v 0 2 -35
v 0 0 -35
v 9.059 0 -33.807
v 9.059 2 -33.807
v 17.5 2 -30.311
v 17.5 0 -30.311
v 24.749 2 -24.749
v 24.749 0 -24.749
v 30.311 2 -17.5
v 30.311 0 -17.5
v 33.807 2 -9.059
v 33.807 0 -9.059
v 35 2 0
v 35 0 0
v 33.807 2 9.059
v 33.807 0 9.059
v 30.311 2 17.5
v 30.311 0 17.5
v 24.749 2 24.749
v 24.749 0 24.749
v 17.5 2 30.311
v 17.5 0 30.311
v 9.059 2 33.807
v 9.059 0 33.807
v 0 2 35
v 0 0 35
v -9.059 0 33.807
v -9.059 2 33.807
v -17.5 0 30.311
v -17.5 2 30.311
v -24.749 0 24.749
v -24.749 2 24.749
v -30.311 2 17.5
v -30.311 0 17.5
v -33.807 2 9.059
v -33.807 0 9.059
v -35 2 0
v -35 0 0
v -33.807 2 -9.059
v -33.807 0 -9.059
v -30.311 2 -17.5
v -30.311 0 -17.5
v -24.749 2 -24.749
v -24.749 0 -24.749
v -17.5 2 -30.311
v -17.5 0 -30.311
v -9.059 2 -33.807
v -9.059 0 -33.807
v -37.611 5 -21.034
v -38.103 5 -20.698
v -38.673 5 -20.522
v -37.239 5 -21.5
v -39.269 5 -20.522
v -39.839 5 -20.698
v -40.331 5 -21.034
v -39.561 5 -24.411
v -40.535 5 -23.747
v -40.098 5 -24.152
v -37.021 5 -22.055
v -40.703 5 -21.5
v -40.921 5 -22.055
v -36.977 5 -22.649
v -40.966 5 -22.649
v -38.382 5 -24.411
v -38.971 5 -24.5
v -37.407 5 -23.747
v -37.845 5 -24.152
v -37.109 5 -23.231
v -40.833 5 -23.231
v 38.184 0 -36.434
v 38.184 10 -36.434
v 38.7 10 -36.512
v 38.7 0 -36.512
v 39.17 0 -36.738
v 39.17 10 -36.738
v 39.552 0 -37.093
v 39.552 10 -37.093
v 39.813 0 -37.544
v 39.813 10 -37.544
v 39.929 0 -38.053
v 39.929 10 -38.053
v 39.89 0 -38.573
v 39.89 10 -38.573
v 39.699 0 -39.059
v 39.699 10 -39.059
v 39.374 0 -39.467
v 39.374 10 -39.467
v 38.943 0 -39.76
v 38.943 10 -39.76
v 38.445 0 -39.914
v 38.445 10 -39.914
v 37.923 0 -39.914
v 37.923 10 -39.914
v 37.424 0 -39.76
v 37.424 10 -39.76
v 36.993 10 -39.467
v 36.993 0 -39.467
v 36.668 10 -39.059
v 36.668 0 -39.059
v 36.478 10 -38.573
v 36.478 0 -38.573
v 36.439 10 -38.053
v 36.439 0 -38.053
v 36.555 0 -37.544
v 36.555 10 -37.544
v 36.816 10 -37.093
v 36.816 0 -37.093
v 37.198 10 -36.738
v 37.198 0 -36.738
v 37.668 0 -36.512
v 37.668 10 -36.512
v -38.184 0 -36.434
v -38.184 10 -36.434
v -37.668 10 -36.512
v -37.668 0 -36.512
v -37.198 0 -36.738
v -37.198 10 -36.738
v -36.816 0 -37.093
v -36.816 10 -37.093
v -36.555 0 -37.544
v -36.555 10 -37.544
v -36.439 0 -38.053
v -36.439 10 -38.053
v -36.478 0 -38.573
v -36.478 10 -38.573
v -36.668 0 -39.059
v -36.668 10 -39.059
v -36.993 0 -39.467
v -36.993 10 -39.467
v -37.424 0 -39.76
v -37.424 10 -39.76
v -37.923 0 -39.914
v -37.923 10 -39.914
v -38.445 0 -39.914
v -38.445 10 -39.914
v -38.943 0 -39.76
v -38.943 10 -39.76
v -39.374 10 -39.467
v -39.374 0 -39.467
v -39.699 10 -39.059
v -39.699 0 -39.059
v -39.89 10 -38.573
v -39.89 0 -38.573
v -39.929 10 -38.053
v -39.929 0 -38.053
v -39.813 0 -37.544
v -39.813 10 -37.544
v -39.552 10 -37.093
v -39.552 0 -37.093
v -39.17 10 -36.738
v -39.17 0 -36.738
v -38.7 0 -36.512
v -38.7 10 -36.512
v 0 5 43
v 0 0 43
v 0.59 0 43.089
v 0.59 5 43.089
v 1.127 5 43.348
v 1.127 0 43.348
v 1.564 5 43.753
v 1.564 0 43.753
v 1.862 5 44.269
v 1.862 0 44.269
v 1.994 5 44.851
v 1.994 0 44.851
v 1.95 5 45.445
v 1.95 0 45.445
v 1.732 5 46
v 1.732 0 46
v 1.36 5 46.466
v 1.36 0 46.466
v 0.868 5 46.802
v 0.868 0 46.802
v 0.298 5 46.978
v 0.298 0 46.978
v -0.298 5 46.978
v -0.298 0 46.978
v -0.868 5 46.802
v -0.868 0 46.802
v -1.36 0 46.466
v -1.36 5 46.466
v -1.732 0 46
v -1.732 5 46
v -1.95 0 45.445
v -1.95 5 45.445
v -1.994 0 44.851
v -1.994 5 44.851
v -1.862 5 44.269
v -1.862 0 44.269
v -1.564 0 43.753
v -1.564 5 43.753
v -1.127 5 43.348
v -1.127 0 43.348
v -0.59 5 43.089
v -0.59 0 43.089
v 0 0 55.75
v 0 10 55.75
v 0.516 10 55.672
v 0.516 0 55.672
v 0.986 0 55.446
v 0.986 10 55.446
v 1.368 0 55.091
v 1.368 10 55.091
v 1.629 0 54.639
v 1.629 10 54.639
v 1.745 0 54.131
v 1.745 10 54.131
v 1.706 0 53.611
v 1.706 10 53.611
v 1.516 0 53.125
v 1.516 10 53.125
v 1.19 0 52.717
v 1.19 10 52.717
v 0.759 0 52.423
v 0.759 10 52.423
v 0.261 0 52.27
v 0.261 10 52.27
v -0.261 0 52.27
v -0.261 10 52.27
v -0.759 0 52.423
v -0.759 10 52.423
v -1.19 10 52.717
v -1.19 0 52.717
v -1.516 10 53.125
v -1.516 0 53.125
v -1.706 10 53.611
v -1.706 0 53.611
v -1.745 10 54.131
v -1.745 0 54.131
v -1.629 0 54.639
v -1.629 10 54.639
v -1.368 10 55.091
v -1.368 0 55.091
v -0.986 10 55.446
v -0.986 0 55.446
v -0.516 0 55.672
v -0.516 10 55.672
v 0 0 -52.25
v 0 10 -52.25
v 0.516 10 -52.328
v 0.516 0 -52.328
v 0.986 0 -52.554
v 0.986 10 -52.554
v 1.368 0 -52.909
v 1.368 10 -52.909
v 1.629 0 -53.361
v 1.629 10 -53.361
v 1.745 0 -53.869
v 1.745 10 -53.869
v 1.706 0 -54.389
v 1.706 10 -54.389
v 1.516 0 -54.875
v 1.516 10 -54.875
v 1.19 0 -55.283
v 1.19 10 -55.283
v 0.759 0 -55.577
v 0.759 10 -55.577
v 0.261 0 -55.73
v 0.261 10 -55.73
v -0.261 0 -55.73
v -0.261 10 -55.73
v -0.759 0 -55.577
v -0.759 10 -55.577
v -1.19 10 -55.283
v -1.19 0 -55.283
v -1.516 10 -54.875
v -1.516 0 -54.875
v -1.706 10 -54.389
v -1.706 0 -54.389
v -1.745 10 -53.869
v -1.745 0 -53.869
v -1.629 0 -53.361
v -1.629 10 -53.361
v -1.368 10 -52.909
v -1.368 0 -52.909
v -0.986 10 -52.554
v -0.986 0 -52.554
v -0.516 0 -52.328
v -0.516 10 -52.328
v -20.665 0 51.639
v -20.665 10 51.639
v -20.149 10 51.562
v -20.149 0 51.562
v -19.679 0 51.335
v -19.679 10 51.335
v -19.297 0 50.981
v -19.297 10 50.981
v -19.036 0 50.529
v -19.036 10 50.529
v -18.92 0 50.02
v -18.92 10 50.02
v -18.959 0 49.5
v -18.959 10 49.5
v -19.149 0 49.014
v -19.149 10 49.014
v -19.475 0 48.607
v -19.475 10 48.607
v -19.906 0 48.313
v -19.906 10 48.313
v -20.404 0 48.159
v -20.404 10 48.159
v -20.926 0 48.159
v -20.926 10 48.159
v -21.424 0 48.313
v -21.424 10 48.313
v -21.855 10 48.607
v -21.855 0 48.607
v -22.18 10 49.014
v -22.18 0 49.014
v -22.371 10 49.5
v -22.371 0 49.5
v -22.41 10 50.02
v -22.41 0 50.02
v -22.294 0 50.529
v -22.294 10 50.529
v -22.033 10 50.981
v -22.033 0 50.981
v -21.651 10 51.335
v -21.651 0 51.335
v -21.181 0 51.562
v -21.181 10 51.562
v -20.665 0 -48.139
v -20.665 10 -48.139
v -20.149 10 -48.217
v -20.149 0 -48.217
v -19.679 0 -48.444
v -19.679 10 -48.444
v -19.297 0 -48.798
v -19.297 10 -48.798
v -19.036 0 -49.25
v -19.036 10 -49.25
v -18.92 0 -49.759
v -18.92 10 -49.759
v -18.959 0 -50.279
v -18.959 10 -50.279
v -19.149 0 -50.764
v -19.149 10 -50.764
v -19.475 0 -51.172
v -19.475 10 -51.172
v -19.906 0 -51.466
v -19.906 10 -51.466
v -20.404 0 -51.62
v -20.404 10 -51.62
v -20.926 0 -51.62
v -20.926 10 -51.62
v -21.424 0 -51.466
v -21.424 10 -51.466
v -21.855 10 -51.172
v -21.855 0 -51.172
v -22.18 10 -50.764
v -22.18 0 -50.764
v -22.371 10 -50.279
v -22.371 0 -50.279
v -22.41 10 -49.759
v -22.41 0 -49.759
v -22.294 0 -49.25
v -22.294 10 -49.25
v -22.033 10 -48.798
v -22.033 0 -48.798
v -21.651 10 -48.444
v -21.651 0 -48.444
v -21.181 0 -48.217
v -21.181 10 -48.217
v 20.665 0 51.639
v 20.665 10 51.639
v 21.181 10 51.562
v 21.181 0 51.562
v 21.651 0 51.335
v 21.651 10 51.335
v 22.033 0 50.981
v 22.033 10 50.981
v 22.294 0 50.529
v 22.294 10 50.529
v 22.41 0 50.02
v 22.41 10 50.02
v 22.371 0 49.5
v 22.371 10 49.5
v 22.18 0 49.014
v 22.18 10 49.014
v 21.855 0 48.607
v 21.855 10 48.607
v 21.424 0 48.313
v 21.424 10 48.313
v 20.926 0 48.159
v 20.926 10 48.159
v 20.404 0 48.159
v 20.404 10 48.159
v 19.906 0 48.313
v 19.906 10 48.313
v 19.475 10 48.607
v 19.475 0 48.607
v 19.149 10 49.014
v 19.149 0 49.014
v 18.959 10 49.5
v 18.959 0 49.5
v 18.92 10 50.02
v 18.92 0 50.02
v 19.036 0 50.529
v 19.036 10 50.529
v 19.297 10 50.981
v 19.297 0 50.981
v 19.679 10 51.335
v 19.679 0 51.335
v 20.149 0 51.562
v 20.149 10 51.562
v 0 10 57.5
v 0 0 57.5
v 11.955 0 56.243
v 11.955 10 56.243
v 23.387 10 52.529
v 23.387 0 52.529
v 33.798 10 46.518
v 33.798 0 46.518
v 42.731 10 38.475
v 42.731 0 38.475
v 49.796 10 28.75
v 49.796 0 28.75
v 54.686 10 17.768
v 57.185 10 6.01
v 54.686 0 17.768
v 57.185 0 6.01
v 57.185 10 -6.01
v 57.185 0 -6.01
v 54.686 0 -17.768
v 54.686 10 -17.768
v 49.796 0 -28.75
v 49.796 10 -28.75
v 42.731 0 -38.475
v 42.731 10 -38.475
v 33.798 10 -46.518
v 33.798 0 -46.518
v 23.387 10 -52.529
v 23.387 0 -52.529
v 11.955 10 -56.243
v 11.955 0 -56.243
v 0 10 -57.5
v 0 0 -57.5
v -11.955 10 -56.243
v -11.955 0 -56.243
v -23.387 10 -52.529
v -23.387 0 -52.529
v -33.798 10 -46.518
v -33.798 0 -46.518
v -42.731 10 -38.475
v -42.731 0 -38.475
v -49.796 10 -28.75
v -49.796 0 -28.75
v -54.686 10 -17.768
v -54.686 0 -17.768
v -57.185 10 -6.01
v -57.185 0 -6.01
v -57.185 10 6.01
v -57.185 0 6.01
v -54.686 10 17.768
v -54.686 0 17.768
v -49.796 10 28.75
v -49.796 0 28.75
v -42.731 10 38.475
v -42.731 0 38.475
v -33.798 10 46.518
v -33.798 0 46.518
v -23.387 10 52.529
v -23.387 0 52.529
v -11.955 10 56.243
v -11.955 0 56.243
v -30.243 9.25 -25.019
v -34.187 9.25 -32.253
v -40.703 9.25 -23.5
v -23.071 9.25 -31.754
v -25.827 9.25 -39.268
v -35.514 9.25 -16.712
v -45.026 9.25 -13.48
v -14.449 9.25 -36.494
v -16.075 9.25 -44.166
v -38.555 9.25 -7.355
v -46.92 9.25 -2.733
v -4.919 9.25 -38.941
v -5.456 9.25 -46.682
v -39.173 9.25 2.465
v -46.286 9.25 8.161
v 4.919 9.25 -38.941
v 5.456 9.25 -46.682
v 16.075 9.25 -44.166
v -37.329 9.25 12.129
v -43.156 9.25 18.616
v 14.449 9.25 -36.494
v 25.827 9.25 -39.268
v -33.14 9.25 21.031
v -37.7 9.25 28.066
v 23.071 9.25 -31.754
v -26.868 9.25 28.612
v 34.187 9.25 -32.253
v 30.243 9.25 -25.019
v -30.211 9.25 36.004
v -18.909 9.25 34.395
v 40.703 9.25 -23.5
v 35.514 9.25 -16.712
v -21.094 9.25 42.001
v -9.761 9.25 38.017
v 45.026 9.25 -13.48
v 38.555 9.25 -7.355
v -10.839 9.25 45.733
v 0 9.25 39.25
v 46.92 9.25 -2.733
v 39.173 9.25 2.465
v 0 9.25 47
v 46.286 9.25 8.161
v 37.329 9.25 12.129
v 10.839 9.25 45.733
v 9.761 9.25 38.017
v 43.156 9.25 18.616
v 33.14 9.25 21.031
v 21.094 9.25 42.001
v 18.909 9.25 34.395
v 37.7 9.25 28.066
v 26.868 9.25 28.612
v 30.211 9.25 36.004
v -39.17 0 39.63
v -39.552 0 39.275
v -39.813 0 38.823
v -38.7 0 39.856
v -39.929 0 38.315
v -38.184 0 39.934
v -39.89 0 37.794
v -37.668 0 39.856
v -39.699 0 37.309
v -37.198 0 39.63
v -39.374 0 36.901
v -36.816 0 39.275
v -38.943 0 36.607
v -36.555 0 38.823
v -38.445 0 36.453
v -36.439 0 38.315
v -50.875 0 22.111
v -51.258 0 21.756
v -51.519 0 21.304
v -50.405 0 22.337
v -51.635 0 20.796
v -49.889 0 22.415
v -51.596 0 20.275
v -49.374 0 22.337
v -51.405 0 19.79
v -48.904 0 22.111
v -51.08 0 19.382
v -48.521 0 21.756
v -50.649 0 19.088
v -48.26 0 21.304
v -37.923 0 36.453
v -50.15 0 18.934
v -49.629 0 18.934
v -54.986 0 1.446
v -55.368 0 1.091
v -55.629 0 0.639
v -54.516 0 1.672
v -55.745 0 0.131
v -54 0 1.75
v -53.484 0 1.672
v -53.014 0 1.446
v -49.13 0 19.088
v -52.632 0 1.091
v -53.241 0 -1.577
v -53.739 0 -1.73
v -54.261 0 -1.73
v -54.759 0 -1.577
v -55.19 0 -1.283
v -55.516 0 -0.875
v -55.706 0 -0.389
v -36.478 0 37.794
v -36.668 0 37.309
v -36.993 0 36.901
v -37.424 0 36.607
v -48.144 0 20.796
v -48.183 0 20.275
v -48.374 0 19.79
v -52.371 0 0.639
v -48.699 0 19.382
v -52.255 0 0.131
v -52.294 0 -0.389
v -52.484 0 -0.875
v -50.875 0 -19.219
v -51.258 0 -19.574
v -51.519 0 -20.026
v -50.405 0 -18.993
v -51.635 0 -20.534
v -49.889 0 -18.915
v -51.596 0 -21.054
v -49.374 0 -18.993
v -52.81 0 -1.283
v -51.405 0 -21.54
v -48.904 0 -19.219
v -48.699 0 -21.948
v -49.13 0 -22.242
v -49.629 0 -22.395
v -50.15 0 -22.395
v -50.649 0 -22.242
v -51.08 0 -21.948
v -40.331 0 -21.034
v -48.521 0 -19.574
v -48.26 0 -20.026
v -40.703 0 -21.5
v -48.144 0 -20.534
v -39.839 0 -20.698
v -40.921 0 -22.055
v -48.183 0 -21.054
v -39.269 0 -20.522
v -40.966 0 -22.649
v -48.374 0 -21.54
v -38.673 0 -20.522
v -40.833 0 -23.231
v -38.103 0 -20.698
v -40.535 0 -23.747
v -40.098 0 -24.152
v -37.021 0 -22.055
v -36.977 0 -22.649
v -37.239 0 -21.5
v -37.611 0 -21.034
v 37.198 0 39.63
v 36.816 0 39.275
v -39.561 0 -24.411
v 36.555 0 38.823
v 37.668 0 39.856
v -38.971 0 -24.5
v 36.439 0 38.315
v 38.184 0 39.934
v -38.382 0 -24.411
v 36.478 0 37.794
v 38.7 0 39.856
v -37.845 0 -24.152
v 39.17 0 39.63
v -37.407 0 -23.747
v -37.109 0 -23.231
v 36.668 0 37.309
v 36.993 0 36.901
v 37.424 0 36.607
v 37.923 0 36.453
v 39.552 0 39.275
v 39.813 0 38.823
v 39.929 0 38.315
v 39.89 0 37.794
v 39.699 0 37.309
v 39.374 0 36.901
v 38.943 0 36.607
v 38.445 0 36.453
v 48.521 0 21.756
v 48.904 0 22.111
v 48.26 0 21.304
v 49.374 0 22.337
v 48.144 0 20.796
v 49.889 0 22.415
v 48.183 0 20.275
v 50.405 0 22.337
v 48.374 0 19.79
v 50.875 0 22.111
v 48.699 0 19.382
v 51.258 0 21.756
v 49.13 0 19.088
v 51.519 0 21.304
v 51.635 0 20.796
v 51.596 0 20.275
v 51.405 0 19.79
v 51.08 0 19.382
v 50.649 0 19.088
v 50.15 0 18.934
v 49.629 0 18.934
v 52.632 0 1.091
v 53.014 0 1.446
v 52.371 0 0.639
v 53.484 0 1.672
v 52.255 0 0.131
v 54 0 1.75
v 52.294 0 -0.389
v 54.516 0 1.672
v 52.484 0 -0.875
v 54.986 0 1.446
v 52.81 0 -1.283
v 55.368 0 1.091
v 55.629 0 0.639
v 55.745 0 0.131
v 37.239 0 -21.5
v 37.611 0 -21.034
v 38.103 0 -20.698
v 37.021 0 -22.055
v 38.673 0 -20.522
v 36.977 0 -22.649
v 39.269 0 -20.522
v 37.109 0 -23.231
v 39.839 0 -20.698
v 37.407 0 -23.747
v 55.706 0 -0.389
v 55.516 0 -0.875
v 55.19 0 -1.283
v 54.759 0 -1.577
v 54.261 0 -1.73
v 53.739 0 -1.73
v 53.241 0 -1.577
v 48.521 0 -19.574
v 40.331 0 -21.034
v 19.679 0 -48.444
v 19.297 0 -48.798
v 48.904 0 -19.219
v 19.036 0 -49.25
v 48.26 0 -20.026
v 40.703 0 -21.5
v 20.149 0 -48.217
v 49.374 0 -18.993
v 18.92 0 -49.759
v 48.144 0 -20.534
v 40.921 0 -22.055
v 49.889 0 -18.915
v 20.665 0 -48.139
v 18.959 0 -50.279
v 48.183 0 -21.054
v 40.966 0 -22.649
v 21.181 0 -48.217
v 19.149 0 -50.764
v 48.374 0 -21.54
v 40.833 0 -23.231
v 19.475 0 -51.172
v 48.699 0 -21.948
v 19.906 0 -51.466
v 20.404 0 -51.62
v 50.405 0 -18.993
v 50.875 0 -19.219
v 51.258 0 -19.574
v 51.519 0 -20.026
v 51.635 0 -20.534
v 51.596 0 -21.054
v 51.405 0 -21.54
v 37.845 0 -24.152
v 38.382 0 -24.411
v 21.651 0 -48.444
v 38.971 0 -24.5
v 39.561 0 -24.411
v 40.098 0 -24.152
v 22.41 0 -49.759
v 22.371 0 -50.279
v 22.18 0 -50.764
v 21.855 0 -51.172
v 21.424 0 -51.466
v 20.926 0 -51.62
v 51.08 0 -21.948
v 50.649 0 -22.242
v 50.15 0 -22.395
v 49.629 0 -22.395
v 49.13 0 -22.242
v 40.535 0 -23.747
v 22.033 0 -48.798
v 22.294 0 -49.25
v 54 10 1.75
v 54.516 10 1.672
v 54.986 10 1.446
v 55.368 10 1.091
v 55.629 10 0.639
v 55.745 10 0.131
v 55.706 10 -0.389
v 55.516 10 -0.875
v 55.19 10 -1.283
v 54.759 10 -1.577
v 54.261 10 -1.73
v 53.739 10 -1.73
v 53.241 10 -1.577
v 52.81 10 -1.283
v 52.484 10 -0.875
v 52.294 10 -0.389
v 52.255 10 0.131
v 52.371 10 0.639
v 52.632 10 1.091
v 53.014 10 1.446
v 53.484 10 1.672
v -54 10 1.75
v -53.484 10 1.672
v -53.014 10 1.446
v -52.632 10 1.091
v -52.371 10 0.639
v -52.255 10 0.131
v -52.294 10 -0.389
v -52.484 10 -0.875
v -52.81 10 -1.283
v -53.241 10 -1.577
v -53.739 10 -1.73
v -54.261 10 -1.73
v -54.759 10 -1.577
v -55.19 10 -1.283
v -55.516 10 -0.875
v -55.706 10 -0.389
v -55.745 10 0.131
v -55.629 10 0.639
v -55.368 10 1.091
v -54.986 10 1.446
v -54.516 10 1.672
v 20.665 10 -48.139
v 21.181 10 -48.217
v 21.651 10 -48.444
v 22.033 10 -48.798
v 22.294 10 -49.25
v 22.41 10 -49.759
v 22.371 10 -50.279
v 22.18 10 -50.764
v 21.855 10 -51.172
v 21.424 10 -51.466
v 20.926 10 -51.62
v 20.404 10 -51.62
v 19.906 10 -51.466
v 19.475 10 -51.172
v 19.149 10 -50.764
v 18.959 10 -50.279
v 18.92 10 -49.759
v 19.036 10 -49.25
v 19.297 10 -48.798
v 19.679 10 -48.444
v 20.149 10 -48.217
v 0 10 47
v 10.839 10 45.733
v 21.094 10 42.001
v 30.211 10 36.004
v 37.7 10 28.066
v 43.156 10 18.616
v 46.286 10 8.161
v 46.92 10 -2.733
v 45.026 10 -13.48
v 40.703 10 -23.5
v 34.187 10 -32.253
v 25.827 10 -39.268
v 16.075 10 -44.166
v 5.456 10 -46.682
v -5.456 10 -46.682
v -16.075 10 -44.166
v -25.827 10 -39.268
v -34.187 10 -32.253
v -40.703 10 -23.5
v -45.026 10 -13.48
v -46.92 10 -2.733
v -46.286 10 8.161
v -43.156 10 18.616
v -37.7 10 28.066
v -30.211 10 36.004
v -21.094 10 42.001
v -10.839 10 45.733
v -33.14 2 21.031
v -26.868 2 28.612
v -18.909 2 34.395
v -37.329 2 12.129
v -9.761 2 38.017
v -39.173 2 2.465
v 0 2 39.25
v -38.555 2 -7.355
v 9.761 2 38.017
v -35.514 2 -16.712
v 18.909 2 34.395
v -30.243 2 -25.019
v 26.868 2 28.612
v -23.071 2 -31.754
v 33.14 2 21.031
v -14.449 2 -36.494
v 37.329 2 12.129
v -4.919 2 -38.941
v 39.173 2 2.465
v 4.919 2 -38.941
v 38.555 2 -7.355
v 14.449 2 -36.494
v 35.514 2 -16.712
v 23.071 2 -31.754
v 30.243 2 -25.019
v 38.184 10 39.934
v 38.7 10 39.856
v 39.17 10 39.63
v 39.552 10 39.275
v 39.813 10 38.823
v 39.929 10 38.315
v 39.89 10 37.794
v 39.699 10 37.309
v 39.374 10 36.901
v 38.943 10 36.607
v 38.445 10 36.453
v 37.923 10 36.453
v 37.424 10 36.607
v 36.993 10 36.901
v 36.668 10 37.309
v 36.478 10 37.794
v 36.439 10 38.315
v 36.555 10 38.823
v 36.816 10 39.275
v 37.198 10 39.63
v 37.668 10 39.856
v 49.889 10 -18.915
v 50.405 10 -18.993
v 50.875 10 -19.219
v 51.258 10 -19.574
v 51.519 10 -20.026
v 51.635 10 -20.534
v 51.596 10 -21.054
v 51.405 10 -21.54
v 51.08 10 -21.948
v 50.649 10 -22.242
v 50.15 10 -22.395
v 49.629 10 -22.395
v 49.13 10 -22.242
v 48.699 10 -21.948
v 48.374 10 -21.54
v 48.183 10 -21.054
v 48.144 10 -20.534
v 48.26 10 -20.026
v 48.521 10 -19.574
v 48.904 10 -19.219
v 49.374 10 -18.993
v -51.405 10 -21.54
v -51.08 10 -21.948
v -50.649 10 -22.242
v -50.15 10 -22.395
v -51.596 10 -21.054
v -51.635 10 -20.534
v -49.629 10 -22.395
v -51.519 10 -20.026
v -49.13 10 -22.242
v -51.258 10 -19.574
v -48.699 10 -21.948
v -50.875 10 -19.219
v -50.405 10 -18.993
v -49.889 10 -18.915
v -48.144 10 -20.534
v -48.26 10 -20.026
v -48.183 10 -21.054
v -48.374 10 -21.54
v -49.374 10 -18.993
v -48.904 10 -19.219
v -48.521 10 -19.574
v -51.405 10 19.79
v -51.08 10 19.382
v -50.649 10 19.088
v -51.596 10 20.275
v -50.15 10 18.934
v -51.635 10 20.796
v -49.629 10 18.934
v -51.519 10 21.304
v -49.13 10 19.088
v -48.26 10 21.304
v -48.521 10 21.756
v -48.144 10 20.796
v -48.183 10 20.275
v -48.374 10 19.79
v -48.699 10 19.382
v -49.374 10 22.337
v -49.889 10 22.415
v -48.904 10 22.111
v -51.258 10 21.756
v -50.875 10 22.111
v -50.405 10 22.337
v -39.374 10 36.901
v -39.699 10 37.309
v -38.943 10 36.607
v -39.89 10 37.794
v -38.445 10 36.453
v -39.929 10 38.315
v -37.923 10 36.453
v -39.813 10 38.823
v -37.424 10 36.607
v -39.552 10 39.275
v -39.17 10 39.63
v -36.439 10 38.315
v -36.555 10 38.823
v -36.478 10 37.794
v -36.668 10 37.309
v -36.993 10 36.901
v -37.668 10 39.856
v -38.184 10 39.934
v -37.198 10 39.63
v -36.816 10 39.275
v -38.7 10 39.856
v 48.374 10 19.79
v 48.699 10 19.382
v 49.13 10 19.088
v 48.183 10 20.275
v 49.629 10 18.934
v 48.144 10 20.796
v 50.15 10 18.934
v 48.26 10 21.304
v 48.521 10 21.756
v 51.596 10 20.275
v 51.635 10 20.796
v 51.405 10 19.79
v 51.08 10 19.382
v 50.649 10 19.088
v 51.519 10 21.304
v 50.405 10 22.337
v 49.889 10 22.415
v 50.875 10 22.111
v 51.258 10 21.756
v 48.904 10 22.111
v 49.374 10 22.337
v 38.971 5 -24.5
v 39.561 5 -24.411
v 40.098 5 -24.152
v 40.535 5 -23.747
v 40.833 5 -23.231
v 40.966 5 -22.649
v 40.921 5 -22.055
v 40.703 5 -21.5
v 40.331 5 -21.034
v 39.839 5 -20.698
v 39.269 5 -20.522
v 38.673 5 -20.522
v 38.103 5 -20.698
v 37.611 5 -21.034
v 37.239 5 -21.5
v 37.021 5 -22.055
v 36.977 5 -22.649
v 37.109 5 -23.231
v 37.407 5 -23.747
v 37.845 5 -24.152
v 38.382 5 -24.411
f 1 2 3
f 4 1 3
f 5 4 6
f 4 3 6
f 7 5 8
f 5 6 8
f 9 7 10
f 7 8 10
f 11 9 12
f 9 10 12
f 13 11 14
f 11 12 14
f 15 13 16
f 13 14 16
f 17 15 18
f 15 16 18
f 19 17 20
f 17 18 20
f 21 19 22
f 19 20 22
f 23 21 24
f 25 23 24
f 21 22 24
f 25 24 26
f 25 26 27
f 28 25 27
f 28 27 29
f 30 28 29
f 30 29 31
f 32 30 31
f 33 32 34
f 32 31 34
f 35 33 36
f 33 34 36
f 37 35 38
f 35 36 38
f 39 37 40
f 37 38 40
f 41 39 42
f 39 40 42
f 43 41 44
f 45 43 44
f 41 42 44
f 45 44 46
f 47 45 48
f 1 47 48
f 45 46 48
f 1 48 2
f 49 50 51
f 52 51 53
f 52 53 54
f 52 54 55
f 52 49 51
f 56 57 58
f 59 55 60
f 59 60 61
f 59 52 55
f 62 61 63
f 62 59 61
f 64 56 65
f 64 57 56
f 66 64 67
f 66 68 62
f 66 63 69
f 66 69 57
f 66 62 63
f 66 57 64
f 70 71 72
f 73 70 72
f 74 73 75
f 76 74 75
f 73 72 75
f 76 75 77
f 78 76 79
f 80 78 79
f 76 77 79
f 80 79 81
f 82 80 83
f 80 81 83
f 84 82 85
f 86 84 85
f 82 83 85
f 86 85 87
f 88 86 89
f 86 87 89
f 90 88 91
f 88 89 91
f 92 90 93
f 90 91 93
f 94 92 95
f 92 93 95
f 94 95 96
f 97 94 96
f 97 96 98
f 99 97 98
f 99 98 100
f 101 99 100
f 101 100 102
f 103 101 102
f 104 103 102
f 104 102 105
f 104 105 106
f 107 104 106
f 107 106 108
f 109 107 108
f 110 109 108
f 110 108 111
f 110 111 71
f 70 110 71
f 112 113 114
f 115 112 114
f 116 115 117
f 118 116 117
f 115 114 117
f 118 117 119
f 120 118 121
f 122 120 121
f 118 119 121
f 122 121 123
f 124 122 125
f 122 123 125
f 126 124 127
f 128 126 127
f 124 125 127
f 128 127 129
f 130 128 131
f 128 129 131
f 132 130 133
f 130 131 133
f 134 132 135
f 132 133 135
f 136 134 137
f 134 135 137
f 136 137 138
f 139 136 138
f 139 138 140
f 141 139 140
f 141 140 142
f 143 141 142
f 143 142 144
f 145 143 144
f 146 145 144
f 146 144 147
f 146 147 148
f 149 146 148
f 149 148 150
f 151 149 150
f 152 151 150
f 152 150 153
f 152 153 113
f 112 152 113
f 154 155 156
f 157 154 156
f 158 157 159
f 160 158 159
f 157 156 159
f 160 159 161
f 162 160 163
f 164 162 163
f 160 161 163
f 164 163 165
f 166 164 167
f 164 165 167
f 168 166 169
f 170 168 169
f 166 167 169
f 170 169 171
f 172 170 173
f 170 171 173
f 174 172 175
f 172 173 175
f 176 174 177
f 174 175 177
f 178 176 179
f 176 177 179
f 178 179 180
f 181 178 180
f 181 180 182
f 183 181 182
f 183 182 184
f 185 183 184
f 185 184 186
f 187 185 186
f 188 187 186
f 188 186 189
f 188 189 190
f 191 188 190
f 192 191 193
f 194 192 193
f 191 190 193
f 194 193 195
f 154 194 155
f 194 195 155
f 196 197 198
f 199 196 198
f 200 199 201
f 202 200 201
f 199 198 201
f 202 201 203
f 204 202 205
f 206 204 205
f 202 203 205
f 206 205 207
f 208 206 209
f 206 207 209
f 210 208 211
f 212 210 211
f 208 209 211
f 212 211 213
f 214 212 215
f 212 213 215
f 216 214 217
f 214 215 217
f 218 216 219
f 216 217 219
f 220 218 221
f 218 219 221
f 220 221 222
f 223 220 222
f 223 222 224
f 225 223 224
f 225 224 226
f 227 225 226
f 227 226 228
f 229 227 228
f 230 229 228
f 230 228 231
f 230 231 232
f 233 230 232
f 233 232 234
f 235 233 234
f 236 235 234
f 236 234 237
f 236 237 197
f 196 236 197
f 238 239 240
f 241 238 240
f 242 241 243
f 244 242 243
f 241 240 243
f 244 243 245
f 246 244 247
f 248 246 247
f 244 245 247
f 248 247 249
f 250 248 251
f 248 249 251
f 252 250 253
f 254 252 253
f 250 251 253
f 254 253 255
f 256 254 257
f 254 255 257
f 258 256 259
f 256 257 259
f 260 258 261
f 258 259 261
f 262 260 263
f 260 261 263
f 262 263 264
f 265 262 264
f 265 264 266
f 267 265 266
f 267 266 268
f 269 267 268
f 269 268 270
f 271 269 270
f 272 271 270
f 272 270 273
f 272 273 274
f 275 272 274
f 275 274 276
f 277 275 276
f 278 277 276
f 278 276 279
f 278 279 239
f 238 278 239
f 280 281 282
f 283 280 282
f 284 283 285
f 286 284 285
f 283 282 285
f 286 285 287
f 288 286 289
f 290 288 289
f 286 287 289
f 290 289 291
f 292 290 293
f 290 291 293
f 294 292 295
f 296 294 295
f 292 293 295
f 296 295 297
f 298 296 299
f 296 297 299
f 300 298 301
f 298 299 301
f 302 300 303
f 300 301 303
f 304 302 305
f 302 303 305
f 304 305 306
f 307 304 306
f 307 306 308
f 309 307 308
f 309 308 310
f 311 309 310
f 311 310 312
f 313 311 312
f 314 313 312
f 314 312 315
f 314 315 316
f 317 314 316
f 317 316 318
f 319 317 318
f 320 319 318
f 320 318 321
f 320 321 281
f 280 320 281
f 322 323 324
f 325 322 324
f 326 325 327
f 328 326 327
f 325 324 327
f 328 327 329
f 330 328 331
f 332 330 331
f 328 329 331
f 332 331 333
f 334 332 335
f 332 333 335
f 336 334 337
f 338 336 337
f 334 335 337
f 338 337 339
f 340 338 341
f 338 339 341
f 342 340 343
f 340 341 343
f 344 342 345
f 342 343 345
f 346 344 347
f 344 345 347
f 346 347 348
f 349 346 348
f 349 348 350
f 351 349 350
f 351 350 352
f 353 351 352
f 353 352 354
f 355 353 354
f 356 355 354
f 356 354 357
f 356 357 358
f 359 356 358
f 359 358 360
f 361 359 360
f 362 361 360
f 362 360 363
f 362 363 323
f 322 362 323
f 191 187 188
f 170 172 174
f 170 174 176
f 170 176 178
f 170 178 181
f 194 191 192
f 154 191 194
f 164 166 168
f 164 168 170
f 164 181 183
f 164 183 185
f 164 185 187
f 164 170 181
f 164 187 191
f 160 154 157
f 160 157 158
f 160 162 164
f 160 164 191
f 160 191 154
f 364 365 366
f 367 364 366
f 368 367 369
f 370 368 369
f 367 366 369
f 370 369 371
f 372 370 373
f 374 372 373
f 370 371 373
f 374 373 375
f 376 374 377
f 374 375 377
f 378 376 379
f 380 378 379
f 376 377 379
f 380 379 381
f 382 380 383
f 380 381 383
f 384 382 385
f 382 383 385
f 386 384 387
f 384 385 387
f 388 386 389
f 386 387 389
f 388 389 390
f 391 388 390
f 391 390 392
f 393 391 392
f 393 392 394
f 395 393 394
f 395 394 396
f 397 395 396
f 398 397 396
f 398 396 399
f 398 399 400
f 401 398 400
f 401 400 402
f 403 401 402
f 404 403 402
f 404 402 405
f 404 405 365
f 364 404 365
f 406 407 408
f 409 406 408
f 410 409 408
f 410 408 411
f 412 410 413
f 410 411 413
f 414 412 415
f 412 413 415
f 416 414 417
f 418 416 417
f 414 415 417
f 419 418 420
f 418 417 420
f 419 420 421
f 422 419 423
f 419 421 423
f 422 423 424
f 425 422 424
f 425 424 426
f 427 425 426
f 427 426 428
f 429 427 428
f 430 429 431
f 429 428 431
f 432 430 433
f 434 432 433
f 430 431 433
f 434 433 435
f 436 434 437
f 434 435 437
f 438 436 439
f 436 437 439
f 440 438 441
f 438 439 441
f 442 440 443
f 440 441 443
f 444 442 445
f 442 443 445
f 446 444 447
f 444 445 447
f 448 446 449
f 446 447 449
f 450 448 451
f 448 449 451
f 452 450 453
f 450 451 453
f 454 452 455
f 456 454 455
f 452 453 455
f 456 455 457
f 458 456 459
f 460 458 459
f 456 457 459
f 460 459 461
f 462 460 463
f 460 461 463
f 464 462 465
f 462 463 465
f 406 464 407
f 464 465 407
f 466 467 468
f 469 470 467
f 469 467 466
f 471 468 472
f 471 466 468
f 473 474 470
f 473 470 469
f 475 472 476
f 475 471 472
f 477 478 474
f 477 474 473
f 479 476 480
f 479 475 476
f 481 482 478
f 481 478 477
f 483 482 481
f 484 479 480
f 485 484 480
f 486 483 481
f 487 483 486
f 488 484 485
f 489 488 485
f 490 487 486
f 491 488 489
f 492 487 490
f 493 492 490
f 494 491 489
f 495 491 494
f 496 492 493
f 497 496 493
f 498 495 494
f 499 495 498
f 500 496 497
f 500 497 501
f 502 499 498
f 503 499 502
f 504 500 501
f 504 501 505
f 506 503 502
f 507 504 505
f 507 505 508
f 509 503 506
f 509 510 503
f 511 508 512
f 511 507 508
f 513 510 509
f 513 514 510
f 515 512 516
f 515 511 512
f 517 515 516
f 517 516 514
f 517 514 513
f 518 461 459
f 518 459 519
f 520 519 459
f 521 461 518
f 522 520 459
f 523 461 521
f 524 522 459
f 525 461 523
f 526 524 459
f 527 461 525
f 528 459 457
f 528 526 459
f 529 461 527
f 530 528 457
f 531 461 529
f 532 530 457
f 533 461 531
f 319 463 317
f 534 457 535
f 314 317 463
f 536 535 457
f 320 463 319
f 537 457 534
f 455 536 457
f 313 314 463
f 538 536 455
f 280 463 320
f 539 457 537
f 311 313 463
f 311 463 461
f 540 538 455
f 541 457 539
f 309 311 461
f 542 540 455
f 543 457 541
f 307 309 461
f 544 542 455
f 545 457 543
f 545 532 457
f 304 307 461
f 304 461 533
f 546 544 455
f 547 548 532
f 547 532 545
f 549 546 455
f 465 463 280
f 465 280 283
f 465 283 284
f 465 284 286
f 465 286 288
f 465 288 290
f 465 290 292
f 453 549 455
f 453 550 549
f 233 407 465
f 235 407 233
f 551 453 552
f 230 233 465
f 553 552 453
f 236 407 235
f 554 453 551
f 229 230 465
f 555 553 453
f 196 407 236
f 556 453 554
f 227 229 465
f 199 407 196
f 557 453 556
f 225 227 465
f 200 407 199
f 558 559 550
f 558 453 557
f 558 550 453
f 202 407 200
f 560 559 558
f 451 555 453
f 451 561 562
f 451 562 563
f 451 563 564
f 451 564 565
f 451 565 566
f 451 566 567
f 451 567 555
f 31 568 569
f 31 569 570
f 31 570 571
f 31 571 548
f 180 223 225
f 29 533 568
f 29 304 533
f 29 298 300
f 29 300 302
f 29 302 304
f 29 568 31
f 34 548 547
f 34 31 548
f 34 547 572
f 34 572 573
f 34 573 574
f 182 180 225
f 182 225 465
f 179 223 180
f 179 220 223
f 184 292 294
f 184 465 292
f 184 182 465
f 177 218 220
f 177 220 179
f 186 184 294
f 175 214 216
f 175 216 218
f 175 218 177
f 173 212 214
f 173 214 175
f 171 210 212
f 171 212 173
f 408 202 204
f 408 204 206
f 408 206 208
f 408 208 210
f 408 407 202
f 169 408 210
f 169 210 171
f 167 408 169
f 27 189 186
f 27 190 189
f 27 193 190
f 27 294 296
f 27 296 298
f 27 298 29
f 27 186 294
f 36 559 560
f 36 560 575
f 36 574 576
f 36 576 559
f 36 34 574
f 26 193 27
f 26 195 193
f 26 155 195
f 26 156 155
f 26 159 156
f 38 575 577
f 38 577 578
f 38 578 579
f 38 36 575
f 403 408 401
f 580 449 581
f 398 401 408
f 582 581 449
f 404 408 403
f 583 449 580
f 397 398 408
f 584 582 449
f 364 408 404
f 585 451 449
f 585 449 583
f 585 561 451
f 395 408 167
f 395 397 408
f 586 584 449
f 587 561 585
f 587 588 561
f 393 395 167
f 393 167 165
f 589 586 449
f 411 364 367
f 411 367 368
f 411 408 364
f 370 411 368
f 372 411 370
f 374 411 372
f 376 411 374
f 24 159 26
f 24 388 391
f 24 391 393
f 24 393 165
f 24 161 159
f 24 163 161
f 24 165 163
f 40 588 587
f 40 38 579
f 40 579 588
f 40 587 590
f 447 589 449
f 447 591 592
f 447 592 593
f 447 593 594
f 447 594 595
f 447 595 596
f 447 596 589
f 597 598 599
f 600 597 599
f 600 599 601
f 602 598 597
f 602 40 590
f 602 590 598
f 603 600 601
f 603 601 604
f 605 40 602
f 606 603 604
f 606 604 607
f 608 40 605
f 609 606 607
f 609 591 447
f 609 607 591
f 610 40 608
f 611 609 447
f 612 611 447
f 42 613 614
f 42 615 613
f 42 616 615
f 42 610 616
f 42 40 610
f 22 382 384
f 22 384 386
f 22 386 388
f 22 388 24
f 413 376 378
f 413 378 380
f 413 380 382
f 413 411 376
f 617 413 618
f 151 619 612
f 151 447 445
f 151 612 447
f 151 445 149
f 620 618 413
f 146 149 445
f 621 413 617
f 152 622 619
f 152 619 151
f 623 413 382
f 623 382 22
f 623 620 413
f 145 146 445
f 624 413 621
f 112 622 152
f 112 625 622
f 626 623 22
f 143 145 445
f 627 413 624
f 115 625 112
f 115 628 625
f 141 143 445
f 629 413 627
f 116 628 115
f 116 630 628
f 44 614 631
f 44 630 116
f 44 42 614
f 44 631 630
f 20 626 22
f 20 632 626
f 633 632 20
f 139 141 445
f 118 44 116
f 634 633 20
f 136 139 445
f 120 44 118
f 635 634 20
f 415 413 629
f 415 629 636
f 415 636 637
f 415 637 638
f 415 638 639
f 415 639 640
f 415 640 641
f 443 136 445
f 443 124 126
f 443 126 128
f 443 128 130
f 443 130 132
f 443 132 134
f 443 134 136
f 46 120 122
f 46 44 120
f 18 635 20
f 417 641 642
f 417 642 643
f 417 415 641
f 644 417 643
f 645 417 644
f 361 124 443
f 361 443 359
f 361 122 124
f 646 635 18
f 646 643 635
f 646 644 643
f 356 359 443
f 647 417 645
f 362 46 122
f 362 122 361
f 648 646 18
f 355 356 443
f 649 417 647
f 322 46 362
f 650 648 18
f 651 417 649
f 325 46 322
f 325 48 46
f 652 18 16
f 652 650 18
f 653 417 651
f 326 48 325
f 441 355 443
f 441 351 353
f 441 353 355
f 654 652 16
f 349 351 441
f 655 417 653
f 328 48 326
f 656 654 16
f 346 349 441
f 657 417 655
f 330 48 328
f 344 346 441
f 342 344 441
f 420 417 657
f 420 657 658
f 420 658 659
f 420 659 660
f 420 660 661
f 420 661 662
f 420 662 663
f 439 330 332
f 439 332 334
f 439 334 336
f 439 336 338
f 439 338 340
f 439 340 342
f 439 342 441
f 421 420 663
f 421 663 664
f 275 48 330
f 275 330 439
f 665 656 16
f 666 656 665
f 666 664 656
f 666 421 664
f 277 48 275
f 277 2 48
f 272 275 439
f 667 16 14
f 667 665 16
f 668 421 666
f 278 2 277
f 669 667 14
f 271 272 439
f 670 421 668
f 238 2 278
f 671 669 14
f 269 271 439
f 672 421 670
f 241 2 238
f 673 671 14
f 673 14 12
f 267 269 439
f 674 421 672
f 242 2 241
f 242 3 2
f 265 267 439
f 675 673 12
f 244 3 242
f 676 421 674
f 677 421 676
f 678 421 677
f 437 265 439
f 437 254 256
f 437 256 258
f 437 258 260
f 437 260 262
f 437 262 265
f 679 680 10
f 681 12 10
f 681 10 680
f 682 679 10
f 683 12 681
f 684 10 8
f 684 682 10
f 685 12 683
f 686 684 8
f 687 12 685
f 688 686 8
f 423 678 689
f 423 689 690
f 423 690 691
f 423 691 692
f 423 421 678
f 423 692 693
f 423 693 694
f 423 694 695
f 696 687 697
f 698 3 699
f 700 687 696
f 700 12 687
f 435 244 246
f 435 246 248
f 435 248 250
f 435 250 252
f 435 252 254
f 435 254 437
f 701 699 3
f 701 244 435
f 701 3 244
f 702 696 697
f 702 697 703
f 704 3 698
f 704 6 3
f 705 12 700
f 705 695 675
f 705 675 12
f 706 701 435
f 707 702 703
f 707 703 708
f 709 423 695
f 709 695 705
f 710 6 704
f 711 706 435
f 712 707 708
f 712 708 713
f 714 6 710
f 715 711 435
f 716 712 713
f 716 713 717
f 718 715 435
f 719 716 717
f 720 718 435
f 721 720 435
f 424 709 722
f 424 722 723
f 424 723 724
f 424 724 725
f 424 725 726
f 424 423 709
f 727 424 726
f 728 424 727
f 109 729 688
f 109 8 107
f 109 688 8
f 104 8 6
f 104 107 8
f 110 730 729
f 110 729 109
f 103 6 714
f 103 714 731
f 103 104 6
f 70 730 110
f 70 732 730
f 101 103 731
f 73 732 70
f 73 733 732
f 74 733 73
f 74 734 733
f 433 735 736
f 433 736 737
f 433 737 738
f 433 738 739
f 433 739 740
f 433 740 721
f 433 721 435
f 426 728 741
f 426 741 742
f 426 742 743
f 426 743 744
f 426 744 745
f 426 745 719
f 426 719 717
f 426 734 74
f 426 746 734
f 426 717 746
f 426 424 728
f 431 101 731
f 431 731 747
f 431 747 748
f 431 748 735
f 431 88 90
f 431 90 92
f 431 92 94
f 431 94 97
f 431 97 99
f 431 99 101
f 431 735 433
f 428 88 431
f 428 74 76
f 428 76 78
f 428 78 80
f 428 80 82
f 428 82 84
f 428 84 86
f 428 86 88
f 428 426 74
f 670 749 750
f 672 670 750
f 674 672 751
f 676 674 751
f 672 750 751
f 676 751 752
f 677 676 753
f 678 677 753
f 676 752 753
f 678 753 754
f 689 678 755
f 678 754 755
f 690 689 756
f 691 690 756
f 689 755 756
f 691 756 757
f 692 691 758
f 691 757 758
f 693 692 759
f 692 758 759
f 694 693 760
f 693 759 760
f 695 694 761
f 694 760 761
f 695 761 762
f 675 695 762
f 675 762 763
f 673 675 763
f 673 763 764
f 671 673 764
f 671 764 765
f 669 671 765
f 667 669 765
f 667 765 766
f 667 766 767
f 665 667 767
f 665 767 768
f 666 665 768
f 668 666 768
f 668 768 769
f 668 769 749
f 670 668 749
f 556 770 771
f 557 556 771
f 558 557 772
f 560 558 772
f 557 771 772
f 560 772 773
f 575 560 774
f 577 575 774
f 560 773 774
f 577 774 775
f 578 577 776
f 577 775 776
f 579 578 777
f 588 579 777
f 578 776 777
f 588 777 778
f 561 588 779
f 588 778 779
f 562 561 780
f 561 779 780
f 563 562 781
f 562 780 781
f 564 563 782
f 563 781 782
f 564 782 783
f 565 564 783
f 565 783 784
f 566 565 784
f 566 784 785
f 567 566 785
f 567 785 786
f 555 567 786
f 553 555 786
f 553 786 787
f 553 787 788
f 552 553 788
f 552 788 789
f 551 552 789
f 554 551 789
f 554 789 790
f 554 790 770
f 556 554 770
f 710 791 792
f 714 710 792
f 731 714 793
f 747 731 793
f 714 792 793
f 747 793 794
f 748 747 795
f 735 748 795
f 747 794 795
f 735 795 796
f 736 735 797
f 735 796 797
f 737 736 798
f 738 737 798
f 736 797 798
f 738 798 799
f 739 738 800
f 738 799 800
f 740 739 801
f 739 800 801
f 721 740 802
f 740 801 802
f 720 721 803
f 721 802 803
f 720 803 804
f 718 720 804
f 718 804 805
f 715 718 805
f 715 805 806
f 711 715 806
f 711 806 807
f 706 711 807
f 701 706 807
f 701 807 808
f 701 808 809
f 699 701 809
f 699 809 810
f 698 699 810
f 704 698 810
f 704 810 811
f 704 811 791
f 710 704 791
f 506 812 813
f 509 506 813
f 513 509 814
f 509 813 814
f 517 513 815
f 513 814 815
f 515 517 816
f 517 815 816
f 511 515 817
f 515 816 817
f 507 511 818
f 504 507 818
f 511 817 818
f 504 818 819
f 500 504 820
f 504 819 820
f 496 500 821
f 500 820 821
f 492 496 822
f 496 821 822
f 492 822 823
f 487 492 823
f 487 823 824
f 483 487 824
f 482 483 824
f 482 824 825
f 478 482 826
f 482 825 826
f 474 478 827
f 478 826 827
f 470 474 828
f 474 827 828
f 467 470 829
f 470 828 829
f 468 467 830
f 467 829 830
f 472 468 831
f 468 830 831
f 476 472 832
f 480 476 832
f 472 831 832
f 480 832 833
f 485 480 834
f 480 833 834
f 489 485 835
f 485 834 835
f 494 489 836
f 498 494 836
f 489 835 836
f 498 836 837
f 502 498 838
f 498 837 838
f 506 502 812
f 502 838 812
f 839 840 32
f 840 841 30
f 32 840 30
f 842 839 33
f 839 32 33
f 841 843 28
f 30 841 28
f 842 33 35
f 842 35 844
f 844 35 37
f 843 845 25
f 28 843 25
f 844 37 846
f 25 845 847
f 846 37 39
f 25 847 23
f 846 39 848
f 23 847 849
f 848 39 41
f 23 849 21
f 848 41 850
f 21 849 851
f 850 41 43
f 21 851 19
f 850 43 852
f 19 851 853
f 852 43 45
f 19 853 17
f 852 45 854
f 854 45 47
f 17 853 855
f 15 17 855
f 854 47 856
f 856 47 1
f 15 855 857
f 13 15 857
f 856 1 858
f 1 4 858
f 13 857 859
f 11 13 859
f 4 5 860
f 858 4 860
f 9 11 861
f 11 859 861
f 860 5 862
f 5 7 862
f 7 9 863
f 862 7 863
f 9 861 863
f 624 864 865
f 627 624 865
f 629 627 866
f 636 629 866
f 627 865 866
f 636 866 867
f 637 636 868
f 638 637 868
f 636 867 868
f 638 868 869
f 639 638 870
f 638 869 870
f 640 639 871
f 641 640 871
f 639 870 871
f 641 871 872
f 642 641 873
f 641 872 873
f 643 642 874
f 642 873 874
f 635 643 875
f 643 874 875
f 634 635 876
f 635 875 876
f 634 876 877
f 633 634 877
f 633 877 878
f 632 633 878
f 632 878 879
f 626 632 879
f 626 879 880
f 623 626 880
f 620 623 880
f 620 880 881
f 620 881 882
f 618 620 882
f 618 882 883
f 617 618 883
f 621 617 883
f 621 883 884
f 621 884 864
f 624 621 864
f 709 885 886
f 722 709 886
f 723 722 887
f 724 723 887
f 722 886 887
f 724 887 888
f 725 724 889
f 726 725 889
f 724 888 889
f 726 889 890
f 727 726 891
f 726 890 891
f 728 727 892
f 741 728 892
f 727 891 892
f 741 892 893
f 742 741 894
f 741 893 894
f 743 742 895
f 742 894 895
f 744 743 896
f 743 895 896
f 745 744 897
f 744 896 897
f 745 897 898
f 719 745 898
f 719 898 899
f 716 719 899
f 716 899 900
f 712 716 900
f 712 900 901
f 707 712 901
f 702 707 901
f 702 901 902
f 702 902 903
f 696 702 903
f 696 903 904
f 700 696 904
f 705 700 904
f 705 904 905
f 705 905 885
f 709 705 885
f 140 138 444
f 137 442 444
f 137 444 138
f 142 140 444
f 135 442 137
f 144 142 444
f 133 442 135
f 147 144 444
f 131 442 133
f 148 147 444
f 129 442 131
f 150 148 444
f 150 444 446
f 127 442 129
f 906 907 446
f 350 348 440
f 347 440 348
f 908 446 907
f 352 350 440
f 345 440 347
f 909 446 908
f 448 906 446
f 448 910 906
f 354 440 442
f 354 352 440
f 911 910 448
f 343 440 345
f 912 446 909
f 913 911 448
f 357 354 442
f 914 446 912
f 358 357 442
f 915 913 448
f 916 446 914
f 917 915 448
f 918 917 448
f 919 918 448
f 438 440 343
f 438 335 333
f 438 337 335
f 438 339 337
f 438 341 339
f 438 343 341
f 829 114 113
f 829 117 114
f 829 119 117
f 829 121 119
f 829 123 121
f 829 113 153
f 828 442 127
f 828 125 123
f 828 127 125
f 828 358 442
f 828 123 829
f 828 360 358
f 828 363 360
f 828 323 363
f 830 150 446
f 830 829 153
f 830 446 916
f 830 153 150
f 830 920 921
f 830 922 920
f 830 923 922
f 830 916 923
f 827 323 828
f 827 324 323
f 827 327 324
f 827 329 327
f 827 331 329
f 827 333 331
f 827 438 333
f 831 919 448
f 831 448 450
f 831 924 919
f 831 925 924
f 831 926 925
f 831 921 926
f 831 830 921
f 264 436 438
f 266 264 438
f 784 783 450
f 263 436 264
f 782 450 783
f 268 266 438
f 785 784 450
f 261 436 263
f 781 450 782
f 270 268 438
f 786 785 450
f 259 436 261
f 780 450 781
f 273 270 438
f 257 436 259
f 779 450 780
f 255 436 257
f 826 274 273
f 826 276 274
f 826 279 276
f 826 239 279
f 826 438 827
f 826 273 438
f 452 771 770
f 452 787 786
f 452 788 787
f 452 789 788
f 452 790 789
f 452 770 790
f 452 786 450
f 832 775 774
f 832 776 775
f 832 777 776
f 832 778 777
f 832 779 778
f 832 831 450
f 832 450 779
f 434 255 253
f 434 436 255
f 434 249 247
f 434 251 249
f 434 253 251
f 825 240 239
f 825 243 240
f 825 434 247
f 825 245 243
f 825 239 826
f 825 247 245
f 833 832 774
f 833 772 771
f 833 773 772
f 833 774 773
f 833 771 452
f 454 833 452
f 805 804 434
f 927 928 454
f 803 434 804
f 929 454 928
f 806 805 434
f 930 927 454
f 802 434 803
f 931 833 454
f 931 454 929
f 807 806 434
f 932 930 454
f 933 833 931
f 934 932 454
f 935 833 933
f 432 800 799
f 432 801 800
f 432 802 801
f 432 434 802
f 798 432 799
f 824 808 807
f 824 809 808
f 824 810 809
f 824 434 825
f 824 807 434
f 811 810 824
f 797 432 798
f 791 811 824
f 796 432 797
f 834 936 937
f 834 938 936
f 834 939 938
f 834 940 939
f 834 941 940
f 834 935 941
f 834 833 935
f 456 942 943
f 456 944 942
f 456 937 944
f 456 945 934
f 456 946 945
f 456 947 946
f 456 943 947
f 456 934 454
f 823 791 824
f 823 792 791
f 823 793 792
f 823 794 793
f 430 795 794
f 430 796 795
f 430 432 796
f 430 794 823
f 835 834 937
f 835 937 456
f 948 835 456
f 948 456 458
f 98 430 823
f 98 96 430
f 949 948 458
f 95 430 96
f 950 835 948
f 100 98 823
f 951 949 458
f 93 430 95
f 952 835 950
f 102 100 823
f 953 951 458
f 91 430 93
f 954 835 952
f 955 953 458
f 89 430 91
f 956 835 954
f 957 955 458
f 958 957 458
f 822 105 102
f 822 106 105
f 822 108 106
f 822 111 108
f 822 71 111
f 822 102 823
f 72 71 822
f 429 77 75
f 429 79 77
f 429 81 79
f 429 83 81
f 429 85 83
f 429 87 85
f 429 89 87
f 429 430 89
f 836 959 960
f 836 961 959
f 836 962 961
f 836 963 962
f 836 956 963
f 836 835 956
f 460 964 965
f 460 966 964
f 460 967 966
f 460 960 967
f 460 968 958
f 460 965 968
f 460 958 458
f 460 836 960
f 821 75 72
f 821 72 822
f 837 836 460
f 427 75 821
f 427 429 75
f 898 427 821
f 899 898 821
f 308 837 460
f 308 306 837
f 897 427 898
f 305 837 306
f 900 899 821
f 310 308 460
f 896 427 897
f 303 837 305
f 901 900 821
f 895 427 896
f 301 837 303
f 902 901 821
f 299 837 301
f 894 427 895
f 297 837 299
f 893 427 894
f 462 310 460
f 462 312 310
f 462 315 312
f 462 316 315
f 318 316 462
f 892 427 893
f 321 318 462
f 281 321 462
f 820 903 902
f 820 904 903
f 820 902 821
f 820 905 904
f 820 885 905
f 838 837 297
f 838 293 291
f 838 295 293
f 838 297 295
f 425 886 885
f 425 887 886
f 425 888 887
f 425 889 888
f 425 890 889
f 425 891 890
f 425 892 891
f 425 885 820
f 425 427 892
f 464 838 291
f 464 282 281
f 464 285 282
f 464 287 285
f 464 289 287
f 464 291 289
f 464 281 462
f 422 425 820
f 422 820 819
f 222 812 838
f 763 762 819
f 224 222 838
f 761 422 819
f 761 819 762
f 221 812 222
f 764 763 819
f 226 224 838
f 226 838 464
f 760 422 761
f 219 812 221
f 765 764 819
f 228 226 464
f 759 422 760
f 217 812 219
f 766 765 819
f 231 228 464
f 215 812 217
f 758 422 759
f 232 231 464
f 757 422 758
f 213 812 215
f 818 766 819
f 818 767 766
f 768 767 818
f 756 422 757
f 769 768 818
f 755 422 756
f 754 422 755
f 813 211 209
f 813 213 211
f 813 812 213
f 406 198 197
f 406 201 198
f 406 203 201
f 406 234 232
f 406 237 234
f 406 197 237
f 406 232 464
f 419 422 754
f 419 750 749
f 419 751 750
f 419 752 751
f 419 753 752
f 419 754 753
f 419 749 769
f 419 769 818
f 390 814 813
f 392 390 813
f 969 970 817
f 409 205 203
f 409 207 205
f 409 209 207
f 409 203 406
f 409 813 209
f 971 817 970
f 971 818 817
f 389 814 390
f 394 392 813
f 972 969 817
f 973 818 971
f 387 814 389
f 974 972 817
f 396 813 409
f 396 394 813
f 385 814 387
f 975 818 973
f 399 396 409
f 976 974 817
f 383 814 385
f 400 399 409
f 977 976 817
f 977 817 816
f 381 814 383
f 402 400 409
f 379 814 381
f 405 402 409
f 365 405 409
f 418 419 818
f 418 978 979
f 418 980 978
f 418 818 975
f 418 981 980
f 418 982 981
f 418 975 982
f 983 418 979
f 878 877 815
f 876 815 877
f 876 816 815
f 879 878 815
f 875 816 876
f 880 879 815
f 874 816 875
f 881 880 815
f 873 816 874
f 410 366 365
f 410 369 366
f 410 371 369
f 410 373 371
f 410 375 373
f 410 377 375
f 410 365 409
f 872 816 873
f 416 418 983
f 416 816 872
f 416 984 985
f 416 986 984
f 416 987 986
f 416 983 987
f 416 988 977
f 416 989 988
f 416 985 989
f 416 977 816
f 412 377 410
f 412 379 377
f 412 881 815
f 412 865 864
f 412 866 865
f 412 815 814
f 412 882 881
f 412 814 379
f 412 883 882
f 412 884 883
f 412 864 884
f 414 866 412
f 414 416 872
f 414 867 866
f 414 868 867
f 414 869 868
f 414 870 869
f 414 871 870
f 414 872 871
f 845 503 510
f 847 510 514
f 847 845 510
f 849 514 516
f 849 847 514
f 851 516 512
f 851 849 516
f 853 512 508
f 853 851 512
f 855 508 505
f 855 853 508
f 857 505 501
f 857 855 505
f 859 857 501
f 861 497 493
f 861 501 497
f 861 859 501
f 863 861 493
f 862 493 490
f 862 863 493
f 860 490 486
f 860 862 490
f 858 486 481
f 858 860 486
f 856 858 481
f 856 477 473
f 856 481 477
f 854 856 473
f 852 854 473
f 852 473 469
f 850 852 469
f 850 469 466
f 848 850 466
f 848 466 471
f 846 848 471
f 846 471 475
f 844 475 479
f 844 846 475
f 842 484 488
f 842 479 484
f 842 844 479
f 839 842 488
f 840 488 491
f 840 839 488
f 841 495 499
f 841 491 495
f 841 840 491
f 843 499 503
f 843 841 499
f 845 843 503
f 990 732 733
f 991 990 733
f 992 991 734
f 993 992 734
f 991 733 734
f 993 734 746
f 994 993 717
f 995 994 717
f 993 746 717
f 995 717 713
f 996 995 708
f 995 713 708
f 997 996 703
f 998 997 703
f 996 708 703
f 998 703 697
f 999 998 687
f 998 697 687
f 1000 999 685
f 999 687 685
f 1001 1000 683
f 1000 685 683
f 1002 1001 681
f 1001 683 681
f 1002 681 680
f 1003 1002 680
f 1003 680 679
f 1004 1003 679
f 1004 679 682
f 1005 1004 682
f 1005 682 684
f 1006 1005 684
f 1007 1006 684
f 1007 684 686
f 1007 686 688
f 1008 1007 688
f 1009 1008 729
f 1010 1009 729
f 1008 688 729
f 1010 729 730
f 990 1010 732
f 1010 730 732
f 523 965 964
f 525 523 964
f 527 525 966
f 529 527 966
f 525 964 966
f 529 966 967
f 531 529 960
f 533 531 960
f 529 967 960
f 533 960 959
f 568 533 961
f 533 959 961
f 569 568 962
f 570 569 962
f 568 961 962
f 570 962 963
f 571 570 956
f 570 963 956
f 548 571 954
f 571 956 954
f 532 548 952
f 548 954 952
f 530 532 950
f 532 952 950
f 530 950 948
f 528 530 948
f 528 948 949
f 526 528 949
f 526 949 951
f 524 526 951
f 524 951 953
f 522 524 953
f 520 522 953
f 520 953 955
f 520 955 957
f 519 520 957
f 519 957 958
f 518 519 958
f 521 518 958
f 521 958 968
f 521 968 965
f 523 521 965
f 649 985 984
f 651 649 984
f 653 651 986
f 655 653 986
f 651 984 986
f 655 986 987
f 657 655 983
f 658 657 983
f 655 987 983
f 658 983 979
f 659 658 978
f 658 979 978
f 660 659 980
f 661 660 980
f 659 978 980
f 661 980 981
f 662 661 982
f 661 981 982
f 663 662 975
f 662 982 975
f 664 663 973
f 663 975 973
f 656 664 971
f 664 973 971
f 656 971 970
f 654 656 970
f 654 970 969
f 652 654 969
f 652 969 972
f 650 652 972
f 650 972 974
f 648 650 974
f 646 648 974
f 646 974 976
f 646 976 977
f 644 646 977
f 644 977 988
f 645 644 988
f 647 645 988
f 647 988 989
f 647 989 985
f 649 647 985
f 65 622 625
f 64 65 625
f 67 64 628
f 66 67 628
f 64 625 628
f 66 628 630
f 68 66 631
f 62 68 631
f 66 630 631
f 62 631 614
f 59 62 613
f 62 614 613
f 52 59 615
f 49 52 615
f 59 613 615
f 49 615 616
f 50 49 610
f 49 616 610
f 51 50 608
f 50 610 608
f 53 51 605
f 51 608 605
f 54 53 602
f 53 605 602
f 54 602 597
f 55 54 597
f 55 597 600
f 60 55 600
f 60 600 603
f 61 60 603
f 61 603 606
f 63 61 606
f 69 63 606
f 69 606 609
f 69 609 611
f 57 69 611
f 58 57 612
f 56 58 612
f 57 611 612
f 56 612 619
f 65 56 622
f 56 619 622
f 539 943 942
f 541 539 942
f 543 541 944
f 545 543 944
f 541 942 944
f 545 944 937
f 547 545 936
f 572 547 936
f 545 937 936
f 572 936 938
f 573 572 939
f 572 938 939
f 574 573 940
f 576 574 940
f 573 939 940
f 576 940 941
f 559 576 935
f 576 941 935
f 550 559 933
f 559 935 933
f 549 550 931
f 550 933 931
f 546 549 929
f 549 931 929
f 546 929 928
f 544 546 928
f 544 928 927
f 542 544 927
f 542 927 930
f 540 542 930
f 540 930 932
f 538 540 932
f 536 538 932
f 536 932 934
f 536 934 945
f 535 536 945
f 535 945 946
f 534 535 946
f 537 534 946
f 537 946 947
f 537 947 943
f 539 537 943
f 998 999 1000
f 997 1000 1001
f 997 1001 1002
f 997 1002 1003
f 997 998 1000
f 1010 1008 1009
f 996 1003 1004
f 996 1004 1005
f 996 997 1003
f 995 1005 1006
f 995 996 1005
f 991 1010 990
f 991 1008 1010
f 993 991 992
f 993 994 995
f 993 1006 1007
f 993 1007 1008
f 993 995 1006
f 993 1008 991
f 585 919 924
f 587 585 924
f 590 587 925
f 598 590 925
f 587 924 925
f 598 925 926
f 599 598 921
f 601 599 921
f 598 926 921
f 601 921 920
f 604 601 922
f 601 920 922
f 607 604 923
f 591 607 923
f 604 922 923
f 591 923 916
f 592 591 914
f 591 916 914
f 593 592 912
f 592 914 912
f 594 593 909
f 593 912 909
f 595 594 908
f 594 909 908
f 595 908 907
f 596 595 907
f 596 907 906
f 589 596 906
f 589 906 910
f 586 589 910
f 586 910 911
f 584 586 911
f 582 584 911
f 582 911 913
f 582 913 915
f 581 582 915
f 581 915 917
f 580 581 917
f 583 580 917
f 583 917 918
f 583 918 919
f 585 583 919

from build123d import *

# Parameters (mm, degrees)
SKETCH1_R           = 57.5
SKETCH1_R_2         = 39.25
BOSS_EXTRUDE1_DEPTH = 10
SKETCH2_R           = 1.75
CUT_EXTRUDE1_DEPTH  = 17
SKETCH3_R           = 47
CUT_EXTRUDE2_DEPTH  = 0.75
SKETCH5_R           = 2
CUT_EXTRUDE3_DEPTH  = 5
SKETCH6_R           = 39.25
SKETCH6_R_2         = 35
BOSS_EXTRUDE2_DEPTH = 2


with BuildPart() as part:
    # Sketch1 → Boss-Extrude1 (new body)
    with BuildSketch(Plane(origin=(0, 0, 0), x_dir=(1, 0, 0), z_dir=(0, 1, 0))):
        with Locations(Location((0, 0, 0), (0, 0, 270))):
            Circle(SKETCH1_R)
        with Locations(Location((0, 0, 0), (0, 0, 270))):
            Circle(SKETCH1_R_2, mode=Mode.SUBTRACT)
    extrude(amount=BOSS_EXTRUDE1_DEPTH)

    # Sketch2 → Cut-Extrude1 (cut)
    with BuildSketch(Plane(origin=(0, 10, 0), x_dir=(1, 0, 0), z_dir=(0, 1, 0))):
        with Locations(Location((0, 54, 0), (0, 0, 270))):
            Circle(SKETCH2_R)
        with Locations(Location((20.664905348, 49.889494756, 0), (0, 0, 270))):
            Circle(SKETCH2_R)
        with Locations(Location((38.183766184, 38.183766184, 0), (0, 0, 270))):
            Circle(SKETCH2_R)
        with Locations(Location((49.889494756, 20.664905348, 0), (0, 0, 270))):
            Circle(SKETCH2_R)
        with Locations(Location((54, 0, 0), (0, 0, 270))):
            Circle(SKETCH2_R)
        with Locations(Location((49.889494756, -20.664905348, 0), (0, 0, 270))):
            Circle(SKETCH2_R)
        with Locations(Location((38.183766184, -38.183766184, 0), (0, 0, 270))):
            Circle(SKETCH2_R)
        with Locations(Location((20.664905348, -49.889494756, 0), (0, 0, 270))):
            Circle(SKETCH2_R)
        with Locations(Location((0, -54, 0), (0, 0, 270))):
            Circle(SKETCH2_R)
        with Locations(Location((-20.664905348, -49.889494756, 0), (0, 0, 270))):
            Circle(SKETCH2_R)
        with Locations(Location((-38.183766184, -38.183766184, 0), (0, 0, 270))):
            Circle(SKETCH2_R)
        with Locations(Location((-49.889494756, -20.664905348, 0), (0, 0, 270))):
            Circle(SKETCH2_R)
        with Locations(Location((-54, 0, 0), (0, 0, 270))):
            Circle(SKETCH2_R)
        with Locations(Location((-49.889494756, 20.664905348, 0), (0, 0, 270))):
            Circle(SKETCH2_R)
        with Locations(Location((-38.183766184, 38.183766184, 0), (0, 0, 270))):
            Circle(SKETCH2_R)
        with Locations(Location((-20.664905348, 49.889494756, 0), (0, 0, 270))):
            Circle(SKETCH2_R)
    extrude(amount=-CUT_EXTRUDE1_DEPTH, mode=Mode.SUBTRACT)

    # Sketch3 → Cut-Extrude2 (cut)
    with BuildSketch(Plane(origin=(0, 10, 0), x_dir=(1, 0, 0), z_dir=(0, 1, 0))):
        with Locations(Location((0, 0, 0), (0, 0, 270))):
            Circle(SKETCH3_R)
    extrude(amount=-CUT_EXTRUDE2_DEPTH, mode=Mode.SUBTRACT)

    # Sketch5 → Cut-Extrude3 (cut)
    with BuildSketch(Plane.XZ):
        with Locations(Location((0, 45, 0), (0, 0, 270))):
            Circle(SKETCH5_R)
        with Locations(Location((38.97114317, -22.5, 0), (0, 0, 270))):
            Circle(SKETCH5_R)
        with Locations(Location((-38.97114317, -22.5, 0), (0, 0, 270))):
            Circle(SKETCH5_R)
    extrude(amount=-CUT_EXTRUDE3_DEPTH, mode=Mode.SUBTRACT)

    # Sketch6 → Boss-Extrude2 (add)
    with BuildSketch(Plane.XZ):
        with Locations(Location((0, 0, 0), (0, 0, 270))):
            Circle(SKETCH6_R)
        with Locations(Location((0, 0, 0), (0, 0, 270))):
            Circle(SKETCH6_R_2, mode=Mode.SUBTRACT)
    extrude(amount=-BOSS_EXTRUDE2_DEPTH)


solid = part.part
